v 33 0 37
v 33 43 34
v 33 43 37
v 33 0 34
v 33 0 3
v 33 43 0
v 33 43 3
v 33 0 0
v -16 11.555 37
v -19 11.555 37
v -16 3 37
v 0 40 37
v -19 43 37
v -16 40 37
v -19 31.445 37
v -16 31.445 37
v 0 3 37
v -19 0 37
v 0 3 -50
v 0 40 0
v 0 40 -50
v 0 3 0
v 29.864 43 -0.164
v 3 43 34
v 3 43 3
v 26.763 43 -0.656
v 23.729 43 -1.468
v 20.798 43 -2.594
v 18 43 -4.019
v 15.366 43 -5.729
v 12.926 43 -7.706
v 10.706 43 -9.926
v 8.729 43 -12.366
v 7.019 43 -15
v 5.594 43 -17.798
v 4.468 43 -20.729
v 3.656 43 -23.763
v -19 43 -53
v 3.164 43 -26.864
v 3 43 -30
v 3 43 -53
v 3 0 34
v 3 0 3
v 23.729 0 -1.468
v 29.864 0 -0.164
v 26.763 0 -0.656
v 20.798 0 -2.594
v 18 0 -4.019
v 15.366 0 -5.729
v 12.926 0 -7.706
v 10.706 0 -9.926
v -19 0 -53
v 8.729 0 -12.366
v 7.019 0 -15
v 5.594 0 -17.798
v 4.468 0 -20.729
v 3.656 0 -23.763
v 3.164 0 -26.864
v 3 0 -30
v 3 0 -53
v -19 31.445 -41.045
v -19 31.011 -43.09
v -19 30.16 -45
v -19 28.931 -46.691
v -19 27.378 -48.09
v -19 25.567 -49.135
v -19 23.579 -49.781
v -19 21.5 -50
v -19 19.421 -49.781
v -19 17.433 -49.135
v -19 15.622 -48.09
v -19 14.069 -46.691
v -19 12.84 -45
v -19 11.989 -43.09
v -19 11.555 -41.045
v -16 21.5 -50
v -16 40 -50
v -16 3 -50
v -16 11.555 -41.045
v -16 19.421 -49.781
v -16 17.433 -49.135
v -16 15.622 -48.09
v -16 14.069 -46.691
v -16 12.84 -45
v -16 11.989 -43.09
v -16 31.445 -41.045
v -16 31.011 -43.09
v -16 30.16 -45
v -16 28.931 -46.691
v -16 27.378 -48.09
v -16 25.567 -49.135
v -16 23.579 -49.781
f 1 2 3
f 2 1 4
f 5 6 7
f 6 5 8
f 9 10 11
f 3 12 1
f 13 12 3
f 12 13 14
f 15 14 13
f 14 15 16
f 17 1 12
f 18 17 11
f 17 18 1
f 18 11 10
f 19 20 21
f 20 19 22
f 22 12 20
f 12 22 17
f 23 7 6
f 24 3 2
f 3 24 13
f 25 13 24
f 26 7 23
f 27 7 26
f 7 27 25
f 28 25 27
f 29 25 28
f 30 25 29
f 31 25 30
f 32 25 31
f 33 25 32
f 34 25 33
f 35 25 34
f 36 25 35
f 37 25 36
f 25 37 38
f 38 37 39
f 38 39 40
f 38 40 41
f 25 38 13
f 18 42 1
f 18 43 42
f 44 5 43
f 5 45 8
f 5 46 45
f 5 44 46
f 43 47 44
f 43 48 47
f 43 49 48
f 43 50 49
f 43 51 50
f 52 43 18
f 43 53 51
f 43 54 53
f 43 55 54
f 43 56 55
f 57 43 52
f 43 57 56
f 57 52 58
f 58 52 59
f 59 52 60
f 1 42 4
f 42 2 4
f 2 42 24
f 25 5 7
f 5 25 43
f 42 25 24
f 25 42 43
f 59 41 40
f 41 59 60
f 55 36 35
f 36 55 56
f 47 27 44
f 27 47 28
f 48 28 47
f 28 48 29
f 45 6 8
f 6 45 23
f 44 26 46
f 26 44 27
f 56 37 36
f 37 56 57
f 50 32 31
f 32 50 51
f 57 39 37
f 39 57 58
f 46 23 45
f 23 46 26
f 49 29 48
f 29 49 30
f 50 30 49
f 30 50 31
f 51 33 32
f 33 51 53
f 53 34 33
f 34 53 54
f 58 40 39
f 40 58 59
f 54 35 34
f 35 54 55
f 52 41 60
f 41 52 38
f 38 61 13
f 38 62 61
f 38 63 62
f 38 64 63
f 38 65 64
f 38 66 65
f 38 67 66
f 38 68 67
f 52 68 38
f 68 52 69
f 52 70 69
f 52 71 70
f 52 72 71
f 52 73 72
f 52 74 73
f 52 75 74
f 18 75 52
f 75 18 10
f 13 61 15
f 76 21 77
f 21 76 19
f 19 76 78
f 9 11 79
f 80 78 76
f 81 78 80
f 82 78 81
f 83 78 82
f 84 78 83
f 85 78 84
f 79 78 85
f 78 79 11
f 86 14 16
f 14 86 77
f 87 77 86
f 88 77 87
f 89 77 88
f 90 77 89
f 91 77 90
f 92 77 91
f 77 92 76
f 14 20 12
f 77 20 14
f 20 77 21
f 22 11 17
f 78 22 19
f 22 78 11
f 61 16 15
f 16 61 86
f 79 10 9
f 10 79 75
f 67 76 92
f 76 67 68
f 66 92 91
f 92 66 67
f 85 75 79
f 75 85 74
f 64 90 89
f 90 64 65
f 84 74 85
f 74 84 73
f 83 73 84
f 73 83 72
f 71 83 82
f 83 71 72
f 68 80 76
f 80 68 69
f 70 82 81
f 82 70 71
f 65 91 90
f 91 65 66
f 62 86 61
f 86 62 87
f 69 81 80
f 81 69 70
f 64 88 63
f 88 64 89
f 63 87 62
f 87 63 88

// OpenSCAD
/*
    bevestig afstandbediening aan vensterbank
    
    TODO
    -   gat verder door laten lopen zodat je een beetje ruimte aan de onderkant hetb
    -   diepte van de AB in de houder variabel maken
    -   bovenste houder iets steviger??
*/




vensterBank  = 31;
AB           = [16, 37, 106];
knoppenOnder = 40;
knoppenBoven = 30;
knopBreedte  = 20; 

wand = 3;
klemDiepte = 30;

vensterBankKlem();
translate([-AB.x - wand, 0, -AB.z / 2]) ABHouder();

module vensterBankKlem() {
    b = AB.y + wand * 2;

    difference() {
        cube([klemDiepte + wand, b, vensterBank + 2 * wand]);
        translate([wand, -b / 2, wand])
        cube([klemDiepte + wand, b * 2, vensterBank]);
    }
    translate([wand, 0, -klemDiepte])
    rounded();
}

module ABHouder() {
    difference() {
        cube([AB.x + wand * 2, AB.y + wand * 2, AB.z / 2 + vensterBank + wand * 2]);
        translate([wand, wand, wand])
        cube([AB.x, AB.y, AB.z]);
        translate([wand * 1.5, AB.y/ 2 + wand, wand])
        uitsparing();
    }
}

module uitsparing() {
    translate([0,0,knopBreedte / 2])
    rotate([0,-90,0])
    hull() {
        cylinder(d=knopBreedte, h = 2 * wand);
        translate([AB.z, 0, 0])
        cylinder(d=knopBreedte, h = 2 * wand);
    }
}

module rounded() {
    b = AB.y + wand * 2;
    difference() {
        cube([klemDiepte, b, klemDiepte]);
        translate([klemDiepte, b/2, 0])
        rotate([90, 0, 0])
        cylinder(r = klemDiepte, h=b * 2, center = true, $fn=60);
    }
}
